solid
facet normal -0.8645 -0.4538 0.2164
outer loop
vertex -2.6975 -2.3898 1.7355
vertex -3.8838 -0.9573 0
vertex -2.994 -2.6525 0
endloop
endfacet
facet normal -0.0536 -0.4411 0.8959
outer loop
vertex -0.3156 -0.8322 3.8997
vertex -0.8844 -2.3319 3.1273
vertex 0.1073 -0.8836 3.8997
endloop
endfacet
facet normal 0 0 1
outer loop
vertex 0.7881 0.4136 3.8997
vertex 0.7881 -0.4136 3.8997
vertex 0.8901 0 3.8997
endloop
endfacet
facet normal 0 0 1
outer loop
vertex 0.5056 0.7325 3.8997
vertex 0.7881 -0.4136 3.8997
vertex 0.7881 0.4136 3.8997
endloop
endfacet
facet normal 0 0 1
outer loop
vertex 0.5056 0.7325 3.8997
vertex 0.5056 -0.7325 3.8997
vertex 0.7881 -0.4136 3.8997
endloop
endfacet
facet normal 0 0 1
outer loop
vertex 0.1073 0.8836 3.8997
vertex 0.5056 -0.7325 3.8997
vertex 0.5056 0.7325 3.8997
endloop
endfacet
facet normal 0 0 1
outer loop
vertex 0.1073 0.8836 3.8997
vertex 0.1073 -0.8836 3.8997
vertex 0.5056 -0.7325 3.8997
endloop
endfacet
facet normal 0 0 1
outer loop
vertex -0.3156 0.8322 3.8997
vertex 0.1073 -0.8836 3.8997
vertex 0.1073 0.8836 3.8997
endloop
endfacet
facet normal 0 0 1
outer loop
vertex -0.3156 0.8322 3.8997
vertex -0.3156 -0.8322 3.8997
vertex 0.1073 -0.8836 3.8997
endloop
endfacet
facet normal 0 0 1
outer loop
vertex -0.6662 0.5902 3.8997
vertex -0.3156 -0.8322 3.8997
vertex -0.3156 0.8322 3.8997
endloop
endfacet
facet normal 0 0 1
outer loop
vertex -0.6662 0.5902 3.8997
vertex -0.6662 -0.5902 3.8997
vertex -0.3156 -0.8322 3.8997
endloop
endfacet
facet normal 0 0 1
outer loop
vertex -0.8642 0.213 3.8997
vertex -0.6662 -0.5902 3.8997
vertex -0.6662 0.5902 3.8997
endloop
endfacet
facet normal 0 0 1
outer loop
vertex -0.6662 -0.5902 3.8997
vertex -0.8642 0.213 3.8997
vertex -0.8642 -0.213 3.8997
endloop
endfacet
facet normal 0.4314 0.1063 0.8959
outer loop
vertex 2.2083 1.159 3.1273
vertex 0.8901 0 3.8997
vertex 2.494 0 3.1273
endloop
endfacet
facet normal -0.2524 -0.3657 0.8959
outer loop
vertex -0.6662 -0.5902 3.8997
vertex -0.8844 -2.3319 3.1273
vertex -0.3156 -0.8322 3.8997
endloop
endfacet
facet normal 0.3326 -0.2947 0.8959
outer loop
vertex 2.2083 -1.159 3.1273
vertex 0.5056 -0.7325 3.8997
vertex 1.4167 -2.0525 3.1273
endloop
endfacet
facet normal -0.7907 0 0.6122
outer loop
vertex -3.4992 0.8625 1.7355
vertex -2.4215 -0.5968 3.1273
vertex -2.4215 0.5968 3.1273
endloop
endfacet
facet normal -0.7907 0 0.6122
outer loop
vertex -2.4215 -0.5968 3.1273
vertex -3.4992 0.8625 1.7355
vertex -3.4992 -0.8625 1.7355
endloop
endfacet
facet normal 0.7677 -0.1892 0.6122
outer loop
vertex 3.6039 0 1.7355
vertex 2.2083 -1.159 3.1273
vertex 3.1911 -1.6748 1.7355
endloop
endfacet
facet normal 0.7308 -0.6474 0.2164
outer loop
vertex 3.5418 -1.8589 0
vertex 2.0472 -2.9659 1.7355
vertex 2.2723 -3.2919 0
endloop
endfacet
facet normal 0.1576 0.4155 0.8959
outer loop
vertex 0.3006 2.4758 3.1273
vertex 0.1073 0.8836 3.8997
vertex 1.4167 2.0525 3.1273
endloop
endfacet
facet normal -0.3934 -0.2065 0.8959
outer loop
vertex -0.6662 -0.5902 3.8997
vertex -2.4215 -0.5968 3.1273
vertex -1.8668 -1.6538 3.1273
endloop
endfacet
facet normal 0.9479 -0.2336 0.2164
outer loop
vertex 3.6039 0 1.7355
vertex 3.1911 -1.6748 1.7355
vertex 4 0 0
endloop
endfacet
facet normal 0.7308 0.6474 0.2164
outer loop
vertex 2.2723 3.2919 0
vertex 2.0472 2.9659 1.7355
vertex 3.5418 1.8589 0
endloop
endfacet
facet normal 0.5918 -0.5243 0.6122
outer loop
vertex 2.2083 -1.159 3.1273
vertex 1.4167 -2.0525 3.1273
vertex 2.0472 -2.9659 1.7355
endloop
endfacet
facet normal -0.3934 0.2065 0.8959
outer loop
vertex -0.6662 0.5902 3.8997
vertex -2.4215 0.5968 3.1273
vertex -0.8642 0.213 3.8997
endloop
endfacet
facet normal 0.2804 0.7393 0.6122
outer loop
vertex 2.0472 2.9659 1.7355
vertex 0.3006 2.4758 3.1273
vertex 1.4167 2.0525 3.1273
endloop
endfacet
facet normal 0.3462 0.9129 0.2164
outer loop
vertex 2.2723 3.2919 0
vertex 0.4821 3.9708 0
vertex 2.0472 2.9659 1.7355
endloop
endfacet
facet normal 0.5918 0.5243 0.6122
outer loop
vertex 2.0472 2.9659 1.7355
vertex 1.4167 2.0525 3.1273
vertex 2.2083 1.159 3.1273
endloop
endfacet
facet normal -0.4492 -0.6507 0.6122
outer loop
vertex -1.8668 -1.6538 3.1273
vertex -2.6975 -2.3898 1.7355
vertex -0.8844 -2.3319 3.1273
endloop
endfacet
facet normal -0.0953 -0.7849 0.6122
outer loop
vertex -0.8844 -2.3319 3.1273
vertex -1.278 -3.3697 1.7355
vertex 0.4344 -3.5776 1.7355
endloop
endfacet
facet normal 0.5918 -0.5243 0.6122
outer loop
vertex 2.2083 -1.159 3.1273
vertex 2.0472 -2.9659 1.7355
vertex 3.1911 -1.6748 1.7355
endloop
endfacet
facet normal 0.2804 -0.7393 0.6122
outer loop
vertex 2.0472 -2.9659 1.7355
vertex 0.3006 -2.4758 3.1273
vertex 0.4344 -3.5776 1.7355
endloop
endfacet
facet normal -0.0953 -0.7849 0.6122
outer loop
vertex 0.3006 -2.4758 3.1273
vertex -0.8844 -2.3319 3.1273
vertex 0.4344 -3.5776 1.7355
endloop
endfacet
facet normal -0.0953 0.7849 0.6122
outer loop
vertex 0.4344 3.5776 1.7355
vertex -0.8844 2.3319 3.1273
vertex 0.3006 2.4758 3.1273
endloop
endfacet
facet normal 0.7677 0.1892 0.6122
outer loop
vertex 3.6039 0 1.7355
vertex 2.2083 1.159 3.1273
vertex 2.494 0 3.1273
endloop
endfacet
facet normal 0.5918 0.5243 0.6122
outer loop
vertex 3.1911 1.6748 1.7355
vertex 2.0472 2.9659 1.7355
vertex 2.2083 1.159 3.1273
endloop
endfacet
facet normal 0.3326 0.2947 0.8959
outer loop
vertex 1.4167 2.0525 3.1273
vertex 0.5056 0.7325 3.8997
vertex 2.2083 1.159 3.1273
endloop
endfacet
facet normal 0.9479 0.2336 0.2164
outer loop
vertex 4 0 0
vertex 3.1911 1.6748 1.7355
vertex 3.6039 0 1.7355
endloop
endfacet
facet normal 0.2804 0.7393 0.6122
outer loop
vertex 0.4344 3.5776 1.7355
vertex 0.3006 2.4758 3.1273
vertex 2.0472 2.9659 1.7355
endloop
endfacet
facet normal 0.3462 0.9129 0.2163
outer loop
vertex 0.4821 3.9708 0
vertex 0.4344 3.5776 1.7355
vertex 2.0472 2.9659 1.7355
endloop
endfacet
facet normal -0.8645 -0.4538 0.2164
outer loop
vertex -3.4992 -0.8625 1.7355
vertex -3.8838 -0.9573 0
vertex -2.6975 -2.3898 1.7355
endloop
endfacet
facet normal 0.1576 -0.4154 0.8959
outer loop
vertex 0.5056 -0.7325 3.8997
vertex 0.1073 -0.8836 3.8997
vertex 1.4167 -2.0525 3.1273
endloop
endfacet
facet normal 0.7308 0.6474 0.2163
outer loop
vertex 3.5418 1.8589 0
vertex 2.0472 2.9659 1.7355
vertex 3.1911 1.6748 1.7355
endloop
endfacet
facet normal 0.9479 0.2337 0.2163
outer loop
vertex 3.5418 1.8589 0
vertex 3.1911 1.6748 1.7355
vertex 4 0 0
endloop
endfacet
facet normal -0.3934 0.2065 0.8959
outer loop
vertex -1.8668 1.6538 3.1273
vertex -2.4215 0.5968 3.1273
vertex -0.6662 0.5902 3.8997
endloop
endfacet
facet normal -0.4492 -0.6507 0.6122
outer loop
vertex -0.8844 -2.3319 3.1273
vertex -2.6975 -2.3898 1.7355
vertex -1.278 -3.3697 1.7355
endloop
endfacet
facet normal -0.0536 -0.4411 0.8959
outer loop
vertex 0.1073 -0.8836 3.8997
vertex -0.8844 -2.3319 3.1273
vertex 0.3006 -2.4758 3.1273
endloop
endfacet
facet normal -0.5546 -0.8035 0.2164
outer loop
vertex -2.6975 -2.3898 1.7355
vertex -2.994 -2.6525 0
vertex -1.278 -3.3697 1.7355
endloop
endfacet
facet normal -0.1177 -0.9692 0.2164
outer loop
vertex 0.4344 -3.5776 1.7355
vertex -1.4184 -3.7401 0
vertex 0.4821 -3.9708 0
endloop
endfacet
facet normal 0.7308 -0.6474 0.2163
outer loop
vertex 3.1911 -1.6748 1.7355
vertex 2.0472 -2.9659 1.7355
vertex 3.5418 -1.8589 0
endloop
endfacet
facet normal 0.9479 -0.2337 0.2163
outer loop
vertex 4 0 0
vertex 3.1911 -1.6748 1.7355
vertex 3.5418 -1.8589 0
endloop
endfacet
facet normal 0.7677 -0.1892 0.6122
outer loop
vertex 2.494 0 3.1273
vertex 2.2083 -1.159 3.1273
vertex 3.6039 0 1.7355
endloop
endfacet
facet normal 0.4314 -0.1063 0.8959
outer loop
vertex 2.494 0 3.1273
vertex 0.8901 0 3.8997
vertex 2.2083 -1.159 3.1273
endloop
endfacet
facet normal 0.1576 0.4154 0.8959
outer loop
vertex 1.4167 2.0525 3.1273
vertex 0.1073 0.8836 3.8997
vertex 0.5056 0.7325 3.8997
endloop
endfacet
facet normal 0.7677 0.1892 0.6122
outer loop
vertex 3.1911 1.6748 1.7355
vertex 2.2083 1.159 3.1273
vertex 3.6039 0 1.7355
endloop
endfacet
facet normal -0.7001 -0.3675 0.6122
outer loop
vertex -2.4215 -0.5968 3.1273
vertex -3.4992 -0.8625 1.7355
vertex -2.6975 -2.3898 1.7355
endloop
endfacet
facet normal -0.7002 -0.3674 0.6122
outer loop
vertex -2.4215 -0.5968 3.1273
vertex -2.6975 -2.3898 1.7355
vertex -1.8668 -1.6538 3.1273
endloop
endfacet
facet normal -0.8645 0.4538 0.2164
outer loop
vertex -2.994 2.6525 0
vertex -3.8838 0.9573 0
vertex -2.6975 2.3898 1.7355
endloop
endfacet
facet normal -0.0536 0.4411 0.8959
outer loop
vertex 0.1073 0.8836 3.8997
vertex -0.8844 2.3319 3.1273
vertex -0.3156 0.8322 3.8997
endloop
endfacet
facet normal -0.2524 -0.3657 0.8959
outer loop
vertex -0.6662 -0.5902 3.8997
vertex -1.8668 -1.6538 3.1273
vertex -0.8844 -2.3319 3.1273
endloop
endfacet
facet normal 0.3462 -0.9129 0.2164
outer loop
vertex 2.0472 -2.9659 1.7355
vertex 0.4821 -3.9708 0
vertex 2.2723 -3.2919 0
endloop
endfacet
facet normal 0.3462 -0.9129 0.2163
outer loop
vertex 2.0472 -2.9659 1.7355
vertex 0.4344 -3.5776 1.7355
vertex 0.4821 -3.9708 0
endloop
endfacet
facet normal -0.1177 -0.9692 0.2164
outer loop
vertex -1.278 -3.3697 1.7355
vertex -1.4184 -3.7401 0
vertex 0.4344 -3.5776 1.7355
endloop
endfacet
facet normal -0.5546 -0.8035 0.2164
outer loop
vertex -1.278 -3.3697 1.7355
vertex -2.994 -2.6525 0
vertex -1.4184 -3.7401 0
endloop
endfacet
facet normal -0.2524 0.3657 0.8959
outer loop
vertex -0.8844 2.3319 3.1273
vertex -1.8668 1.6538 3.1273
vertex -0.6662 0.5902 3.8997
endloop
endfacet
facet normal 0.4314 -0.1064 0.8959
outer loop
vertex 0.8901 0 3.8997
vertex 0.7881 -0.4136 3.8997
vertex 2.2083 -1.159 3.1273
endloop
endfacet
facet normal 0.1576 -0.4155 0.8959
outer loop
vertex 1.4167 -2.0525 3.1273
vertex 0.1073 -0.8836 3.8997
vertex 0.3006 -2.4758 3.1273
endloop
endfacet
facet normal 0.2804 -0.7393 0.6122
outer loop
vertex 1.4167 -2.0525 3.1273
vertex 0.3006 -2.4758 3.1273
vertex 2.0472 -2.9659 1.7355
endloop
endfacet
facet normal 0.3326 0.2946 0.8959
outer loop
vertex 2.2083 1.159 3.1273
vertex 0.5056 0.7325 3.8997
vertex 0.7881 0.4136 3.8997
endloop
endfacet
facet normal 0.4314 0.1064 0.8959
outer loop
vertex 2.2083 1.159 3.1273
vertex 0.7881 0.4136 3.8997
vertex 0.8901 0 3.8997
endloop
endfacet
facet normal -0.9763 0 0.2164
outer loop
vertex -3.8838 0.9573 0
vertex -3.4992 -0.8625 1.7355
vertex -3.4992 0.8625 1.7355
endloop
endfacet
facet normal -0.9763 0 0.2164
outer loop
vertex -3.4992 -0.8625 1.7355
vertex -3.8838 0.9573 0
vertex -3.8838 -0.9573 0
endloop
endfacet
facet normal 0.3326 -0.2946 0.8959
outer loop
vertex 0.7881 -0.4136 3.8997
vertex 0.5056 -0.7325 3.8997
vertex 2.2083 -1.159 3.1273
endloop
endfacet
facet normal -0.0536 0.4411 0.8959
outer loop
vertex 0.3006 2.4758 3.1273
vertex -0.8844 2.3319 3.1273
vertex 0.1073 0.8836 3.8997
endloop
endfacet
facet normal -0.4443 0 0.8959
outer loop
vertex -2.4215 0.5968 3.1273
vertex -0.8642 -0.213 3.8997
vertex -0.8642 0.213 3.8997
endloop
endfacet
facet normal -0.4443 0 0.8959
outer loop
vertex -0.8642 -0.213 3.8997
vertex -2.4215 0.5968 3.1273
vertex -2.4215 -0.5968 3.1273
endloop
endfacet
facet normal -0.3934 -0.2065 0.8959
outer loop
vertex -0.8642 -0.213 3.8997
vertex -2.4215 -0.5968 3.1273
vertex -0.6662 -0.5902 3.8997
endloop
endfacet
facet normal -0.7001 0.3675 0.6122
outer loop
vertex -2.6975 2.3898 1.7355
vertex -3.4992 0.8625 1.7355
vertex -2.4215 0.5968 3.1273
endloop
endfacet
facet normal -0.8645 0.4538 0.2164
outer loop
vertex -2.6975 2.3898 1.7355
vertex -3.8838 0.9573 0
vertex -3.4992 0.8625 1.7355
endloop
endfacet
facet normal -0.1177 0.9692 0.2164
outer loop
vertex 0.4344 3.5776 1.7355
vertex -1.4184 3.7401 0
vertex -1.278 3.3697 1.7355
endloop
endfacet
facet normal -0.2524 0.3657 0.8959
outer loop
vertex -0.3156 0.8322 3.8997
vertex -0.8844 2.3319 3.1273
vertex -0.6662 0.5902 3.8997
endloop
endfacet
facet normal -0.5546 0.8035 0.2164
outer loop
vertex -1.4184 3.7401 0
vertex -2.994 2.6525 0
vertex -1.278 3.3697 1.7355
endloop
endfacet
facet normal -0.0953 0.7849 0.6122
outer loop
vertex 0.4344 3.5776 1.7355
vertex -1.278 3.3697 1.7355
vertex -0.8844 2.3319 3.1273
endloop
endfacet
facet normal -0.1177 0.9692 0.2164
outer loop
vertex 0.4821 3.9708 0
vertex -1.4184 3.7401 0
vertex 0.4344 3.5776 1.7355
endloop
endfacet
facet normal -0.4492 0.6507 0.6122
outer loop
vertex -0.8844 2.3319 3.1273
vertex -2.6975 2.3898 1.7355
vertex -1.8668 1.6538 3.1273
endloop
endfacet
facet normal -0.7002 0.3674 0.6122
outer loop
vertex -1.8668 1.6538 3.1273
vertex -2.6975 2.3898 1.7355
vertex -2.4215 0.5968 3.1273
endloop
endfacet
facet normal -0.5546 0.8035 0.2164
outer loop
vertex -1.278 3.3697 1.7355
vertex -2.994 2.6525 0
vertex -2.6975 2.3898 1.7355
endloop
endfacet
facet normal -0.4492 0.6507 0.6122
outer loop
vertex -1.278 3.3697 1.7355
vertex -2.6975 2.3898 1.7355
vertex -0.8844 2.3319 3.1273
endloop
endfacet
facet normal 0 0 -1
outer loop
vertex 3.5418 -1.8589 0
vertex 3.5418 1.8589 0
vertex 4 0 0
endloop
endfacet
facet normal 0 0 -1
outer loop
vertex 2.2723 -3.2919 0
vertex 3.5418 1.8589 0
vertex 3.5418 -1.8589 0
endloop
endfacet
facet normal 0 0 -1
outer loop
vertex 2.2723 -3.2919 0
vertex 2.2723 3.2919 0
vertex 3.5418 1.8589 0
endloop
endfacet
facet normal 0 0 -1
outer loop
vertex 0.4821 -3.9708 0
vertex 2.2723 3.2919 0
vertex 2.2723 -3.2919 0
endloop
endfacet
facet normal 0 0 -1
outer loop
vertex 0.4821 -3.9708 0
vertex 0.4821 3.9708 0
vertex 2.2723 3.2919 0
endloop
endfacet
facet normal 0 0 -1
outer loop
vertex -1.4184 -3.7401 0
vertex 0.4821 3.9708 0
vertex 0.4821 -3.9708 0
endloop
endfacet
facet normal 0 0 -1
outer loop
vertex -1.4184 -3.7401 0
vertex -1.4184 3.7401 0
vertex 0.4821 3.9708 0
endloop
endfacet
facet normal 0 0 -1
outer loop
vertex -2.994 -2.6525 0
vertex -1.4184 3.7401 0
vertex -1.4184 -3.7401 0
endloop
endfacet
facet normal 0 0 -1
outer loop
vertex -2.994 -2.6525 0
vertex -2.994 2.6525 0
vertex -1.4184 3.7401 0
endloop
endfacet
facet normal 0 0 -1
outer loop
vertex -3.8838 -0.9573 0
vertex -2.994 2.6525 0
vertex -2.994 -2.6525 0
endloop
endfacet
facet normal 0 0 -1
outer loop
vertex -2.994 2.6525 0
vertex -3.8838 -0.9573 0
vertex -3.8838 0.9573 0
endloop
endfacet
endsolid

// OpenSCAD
// Generated by generate_scads.py
intersection() {
  intersection() {
    sphere(r=12);
    sphere(r=4);
    cylinder(h=10, r=12, center=true);
    cylinder(h=15, r=8, center=false);
  }
}
